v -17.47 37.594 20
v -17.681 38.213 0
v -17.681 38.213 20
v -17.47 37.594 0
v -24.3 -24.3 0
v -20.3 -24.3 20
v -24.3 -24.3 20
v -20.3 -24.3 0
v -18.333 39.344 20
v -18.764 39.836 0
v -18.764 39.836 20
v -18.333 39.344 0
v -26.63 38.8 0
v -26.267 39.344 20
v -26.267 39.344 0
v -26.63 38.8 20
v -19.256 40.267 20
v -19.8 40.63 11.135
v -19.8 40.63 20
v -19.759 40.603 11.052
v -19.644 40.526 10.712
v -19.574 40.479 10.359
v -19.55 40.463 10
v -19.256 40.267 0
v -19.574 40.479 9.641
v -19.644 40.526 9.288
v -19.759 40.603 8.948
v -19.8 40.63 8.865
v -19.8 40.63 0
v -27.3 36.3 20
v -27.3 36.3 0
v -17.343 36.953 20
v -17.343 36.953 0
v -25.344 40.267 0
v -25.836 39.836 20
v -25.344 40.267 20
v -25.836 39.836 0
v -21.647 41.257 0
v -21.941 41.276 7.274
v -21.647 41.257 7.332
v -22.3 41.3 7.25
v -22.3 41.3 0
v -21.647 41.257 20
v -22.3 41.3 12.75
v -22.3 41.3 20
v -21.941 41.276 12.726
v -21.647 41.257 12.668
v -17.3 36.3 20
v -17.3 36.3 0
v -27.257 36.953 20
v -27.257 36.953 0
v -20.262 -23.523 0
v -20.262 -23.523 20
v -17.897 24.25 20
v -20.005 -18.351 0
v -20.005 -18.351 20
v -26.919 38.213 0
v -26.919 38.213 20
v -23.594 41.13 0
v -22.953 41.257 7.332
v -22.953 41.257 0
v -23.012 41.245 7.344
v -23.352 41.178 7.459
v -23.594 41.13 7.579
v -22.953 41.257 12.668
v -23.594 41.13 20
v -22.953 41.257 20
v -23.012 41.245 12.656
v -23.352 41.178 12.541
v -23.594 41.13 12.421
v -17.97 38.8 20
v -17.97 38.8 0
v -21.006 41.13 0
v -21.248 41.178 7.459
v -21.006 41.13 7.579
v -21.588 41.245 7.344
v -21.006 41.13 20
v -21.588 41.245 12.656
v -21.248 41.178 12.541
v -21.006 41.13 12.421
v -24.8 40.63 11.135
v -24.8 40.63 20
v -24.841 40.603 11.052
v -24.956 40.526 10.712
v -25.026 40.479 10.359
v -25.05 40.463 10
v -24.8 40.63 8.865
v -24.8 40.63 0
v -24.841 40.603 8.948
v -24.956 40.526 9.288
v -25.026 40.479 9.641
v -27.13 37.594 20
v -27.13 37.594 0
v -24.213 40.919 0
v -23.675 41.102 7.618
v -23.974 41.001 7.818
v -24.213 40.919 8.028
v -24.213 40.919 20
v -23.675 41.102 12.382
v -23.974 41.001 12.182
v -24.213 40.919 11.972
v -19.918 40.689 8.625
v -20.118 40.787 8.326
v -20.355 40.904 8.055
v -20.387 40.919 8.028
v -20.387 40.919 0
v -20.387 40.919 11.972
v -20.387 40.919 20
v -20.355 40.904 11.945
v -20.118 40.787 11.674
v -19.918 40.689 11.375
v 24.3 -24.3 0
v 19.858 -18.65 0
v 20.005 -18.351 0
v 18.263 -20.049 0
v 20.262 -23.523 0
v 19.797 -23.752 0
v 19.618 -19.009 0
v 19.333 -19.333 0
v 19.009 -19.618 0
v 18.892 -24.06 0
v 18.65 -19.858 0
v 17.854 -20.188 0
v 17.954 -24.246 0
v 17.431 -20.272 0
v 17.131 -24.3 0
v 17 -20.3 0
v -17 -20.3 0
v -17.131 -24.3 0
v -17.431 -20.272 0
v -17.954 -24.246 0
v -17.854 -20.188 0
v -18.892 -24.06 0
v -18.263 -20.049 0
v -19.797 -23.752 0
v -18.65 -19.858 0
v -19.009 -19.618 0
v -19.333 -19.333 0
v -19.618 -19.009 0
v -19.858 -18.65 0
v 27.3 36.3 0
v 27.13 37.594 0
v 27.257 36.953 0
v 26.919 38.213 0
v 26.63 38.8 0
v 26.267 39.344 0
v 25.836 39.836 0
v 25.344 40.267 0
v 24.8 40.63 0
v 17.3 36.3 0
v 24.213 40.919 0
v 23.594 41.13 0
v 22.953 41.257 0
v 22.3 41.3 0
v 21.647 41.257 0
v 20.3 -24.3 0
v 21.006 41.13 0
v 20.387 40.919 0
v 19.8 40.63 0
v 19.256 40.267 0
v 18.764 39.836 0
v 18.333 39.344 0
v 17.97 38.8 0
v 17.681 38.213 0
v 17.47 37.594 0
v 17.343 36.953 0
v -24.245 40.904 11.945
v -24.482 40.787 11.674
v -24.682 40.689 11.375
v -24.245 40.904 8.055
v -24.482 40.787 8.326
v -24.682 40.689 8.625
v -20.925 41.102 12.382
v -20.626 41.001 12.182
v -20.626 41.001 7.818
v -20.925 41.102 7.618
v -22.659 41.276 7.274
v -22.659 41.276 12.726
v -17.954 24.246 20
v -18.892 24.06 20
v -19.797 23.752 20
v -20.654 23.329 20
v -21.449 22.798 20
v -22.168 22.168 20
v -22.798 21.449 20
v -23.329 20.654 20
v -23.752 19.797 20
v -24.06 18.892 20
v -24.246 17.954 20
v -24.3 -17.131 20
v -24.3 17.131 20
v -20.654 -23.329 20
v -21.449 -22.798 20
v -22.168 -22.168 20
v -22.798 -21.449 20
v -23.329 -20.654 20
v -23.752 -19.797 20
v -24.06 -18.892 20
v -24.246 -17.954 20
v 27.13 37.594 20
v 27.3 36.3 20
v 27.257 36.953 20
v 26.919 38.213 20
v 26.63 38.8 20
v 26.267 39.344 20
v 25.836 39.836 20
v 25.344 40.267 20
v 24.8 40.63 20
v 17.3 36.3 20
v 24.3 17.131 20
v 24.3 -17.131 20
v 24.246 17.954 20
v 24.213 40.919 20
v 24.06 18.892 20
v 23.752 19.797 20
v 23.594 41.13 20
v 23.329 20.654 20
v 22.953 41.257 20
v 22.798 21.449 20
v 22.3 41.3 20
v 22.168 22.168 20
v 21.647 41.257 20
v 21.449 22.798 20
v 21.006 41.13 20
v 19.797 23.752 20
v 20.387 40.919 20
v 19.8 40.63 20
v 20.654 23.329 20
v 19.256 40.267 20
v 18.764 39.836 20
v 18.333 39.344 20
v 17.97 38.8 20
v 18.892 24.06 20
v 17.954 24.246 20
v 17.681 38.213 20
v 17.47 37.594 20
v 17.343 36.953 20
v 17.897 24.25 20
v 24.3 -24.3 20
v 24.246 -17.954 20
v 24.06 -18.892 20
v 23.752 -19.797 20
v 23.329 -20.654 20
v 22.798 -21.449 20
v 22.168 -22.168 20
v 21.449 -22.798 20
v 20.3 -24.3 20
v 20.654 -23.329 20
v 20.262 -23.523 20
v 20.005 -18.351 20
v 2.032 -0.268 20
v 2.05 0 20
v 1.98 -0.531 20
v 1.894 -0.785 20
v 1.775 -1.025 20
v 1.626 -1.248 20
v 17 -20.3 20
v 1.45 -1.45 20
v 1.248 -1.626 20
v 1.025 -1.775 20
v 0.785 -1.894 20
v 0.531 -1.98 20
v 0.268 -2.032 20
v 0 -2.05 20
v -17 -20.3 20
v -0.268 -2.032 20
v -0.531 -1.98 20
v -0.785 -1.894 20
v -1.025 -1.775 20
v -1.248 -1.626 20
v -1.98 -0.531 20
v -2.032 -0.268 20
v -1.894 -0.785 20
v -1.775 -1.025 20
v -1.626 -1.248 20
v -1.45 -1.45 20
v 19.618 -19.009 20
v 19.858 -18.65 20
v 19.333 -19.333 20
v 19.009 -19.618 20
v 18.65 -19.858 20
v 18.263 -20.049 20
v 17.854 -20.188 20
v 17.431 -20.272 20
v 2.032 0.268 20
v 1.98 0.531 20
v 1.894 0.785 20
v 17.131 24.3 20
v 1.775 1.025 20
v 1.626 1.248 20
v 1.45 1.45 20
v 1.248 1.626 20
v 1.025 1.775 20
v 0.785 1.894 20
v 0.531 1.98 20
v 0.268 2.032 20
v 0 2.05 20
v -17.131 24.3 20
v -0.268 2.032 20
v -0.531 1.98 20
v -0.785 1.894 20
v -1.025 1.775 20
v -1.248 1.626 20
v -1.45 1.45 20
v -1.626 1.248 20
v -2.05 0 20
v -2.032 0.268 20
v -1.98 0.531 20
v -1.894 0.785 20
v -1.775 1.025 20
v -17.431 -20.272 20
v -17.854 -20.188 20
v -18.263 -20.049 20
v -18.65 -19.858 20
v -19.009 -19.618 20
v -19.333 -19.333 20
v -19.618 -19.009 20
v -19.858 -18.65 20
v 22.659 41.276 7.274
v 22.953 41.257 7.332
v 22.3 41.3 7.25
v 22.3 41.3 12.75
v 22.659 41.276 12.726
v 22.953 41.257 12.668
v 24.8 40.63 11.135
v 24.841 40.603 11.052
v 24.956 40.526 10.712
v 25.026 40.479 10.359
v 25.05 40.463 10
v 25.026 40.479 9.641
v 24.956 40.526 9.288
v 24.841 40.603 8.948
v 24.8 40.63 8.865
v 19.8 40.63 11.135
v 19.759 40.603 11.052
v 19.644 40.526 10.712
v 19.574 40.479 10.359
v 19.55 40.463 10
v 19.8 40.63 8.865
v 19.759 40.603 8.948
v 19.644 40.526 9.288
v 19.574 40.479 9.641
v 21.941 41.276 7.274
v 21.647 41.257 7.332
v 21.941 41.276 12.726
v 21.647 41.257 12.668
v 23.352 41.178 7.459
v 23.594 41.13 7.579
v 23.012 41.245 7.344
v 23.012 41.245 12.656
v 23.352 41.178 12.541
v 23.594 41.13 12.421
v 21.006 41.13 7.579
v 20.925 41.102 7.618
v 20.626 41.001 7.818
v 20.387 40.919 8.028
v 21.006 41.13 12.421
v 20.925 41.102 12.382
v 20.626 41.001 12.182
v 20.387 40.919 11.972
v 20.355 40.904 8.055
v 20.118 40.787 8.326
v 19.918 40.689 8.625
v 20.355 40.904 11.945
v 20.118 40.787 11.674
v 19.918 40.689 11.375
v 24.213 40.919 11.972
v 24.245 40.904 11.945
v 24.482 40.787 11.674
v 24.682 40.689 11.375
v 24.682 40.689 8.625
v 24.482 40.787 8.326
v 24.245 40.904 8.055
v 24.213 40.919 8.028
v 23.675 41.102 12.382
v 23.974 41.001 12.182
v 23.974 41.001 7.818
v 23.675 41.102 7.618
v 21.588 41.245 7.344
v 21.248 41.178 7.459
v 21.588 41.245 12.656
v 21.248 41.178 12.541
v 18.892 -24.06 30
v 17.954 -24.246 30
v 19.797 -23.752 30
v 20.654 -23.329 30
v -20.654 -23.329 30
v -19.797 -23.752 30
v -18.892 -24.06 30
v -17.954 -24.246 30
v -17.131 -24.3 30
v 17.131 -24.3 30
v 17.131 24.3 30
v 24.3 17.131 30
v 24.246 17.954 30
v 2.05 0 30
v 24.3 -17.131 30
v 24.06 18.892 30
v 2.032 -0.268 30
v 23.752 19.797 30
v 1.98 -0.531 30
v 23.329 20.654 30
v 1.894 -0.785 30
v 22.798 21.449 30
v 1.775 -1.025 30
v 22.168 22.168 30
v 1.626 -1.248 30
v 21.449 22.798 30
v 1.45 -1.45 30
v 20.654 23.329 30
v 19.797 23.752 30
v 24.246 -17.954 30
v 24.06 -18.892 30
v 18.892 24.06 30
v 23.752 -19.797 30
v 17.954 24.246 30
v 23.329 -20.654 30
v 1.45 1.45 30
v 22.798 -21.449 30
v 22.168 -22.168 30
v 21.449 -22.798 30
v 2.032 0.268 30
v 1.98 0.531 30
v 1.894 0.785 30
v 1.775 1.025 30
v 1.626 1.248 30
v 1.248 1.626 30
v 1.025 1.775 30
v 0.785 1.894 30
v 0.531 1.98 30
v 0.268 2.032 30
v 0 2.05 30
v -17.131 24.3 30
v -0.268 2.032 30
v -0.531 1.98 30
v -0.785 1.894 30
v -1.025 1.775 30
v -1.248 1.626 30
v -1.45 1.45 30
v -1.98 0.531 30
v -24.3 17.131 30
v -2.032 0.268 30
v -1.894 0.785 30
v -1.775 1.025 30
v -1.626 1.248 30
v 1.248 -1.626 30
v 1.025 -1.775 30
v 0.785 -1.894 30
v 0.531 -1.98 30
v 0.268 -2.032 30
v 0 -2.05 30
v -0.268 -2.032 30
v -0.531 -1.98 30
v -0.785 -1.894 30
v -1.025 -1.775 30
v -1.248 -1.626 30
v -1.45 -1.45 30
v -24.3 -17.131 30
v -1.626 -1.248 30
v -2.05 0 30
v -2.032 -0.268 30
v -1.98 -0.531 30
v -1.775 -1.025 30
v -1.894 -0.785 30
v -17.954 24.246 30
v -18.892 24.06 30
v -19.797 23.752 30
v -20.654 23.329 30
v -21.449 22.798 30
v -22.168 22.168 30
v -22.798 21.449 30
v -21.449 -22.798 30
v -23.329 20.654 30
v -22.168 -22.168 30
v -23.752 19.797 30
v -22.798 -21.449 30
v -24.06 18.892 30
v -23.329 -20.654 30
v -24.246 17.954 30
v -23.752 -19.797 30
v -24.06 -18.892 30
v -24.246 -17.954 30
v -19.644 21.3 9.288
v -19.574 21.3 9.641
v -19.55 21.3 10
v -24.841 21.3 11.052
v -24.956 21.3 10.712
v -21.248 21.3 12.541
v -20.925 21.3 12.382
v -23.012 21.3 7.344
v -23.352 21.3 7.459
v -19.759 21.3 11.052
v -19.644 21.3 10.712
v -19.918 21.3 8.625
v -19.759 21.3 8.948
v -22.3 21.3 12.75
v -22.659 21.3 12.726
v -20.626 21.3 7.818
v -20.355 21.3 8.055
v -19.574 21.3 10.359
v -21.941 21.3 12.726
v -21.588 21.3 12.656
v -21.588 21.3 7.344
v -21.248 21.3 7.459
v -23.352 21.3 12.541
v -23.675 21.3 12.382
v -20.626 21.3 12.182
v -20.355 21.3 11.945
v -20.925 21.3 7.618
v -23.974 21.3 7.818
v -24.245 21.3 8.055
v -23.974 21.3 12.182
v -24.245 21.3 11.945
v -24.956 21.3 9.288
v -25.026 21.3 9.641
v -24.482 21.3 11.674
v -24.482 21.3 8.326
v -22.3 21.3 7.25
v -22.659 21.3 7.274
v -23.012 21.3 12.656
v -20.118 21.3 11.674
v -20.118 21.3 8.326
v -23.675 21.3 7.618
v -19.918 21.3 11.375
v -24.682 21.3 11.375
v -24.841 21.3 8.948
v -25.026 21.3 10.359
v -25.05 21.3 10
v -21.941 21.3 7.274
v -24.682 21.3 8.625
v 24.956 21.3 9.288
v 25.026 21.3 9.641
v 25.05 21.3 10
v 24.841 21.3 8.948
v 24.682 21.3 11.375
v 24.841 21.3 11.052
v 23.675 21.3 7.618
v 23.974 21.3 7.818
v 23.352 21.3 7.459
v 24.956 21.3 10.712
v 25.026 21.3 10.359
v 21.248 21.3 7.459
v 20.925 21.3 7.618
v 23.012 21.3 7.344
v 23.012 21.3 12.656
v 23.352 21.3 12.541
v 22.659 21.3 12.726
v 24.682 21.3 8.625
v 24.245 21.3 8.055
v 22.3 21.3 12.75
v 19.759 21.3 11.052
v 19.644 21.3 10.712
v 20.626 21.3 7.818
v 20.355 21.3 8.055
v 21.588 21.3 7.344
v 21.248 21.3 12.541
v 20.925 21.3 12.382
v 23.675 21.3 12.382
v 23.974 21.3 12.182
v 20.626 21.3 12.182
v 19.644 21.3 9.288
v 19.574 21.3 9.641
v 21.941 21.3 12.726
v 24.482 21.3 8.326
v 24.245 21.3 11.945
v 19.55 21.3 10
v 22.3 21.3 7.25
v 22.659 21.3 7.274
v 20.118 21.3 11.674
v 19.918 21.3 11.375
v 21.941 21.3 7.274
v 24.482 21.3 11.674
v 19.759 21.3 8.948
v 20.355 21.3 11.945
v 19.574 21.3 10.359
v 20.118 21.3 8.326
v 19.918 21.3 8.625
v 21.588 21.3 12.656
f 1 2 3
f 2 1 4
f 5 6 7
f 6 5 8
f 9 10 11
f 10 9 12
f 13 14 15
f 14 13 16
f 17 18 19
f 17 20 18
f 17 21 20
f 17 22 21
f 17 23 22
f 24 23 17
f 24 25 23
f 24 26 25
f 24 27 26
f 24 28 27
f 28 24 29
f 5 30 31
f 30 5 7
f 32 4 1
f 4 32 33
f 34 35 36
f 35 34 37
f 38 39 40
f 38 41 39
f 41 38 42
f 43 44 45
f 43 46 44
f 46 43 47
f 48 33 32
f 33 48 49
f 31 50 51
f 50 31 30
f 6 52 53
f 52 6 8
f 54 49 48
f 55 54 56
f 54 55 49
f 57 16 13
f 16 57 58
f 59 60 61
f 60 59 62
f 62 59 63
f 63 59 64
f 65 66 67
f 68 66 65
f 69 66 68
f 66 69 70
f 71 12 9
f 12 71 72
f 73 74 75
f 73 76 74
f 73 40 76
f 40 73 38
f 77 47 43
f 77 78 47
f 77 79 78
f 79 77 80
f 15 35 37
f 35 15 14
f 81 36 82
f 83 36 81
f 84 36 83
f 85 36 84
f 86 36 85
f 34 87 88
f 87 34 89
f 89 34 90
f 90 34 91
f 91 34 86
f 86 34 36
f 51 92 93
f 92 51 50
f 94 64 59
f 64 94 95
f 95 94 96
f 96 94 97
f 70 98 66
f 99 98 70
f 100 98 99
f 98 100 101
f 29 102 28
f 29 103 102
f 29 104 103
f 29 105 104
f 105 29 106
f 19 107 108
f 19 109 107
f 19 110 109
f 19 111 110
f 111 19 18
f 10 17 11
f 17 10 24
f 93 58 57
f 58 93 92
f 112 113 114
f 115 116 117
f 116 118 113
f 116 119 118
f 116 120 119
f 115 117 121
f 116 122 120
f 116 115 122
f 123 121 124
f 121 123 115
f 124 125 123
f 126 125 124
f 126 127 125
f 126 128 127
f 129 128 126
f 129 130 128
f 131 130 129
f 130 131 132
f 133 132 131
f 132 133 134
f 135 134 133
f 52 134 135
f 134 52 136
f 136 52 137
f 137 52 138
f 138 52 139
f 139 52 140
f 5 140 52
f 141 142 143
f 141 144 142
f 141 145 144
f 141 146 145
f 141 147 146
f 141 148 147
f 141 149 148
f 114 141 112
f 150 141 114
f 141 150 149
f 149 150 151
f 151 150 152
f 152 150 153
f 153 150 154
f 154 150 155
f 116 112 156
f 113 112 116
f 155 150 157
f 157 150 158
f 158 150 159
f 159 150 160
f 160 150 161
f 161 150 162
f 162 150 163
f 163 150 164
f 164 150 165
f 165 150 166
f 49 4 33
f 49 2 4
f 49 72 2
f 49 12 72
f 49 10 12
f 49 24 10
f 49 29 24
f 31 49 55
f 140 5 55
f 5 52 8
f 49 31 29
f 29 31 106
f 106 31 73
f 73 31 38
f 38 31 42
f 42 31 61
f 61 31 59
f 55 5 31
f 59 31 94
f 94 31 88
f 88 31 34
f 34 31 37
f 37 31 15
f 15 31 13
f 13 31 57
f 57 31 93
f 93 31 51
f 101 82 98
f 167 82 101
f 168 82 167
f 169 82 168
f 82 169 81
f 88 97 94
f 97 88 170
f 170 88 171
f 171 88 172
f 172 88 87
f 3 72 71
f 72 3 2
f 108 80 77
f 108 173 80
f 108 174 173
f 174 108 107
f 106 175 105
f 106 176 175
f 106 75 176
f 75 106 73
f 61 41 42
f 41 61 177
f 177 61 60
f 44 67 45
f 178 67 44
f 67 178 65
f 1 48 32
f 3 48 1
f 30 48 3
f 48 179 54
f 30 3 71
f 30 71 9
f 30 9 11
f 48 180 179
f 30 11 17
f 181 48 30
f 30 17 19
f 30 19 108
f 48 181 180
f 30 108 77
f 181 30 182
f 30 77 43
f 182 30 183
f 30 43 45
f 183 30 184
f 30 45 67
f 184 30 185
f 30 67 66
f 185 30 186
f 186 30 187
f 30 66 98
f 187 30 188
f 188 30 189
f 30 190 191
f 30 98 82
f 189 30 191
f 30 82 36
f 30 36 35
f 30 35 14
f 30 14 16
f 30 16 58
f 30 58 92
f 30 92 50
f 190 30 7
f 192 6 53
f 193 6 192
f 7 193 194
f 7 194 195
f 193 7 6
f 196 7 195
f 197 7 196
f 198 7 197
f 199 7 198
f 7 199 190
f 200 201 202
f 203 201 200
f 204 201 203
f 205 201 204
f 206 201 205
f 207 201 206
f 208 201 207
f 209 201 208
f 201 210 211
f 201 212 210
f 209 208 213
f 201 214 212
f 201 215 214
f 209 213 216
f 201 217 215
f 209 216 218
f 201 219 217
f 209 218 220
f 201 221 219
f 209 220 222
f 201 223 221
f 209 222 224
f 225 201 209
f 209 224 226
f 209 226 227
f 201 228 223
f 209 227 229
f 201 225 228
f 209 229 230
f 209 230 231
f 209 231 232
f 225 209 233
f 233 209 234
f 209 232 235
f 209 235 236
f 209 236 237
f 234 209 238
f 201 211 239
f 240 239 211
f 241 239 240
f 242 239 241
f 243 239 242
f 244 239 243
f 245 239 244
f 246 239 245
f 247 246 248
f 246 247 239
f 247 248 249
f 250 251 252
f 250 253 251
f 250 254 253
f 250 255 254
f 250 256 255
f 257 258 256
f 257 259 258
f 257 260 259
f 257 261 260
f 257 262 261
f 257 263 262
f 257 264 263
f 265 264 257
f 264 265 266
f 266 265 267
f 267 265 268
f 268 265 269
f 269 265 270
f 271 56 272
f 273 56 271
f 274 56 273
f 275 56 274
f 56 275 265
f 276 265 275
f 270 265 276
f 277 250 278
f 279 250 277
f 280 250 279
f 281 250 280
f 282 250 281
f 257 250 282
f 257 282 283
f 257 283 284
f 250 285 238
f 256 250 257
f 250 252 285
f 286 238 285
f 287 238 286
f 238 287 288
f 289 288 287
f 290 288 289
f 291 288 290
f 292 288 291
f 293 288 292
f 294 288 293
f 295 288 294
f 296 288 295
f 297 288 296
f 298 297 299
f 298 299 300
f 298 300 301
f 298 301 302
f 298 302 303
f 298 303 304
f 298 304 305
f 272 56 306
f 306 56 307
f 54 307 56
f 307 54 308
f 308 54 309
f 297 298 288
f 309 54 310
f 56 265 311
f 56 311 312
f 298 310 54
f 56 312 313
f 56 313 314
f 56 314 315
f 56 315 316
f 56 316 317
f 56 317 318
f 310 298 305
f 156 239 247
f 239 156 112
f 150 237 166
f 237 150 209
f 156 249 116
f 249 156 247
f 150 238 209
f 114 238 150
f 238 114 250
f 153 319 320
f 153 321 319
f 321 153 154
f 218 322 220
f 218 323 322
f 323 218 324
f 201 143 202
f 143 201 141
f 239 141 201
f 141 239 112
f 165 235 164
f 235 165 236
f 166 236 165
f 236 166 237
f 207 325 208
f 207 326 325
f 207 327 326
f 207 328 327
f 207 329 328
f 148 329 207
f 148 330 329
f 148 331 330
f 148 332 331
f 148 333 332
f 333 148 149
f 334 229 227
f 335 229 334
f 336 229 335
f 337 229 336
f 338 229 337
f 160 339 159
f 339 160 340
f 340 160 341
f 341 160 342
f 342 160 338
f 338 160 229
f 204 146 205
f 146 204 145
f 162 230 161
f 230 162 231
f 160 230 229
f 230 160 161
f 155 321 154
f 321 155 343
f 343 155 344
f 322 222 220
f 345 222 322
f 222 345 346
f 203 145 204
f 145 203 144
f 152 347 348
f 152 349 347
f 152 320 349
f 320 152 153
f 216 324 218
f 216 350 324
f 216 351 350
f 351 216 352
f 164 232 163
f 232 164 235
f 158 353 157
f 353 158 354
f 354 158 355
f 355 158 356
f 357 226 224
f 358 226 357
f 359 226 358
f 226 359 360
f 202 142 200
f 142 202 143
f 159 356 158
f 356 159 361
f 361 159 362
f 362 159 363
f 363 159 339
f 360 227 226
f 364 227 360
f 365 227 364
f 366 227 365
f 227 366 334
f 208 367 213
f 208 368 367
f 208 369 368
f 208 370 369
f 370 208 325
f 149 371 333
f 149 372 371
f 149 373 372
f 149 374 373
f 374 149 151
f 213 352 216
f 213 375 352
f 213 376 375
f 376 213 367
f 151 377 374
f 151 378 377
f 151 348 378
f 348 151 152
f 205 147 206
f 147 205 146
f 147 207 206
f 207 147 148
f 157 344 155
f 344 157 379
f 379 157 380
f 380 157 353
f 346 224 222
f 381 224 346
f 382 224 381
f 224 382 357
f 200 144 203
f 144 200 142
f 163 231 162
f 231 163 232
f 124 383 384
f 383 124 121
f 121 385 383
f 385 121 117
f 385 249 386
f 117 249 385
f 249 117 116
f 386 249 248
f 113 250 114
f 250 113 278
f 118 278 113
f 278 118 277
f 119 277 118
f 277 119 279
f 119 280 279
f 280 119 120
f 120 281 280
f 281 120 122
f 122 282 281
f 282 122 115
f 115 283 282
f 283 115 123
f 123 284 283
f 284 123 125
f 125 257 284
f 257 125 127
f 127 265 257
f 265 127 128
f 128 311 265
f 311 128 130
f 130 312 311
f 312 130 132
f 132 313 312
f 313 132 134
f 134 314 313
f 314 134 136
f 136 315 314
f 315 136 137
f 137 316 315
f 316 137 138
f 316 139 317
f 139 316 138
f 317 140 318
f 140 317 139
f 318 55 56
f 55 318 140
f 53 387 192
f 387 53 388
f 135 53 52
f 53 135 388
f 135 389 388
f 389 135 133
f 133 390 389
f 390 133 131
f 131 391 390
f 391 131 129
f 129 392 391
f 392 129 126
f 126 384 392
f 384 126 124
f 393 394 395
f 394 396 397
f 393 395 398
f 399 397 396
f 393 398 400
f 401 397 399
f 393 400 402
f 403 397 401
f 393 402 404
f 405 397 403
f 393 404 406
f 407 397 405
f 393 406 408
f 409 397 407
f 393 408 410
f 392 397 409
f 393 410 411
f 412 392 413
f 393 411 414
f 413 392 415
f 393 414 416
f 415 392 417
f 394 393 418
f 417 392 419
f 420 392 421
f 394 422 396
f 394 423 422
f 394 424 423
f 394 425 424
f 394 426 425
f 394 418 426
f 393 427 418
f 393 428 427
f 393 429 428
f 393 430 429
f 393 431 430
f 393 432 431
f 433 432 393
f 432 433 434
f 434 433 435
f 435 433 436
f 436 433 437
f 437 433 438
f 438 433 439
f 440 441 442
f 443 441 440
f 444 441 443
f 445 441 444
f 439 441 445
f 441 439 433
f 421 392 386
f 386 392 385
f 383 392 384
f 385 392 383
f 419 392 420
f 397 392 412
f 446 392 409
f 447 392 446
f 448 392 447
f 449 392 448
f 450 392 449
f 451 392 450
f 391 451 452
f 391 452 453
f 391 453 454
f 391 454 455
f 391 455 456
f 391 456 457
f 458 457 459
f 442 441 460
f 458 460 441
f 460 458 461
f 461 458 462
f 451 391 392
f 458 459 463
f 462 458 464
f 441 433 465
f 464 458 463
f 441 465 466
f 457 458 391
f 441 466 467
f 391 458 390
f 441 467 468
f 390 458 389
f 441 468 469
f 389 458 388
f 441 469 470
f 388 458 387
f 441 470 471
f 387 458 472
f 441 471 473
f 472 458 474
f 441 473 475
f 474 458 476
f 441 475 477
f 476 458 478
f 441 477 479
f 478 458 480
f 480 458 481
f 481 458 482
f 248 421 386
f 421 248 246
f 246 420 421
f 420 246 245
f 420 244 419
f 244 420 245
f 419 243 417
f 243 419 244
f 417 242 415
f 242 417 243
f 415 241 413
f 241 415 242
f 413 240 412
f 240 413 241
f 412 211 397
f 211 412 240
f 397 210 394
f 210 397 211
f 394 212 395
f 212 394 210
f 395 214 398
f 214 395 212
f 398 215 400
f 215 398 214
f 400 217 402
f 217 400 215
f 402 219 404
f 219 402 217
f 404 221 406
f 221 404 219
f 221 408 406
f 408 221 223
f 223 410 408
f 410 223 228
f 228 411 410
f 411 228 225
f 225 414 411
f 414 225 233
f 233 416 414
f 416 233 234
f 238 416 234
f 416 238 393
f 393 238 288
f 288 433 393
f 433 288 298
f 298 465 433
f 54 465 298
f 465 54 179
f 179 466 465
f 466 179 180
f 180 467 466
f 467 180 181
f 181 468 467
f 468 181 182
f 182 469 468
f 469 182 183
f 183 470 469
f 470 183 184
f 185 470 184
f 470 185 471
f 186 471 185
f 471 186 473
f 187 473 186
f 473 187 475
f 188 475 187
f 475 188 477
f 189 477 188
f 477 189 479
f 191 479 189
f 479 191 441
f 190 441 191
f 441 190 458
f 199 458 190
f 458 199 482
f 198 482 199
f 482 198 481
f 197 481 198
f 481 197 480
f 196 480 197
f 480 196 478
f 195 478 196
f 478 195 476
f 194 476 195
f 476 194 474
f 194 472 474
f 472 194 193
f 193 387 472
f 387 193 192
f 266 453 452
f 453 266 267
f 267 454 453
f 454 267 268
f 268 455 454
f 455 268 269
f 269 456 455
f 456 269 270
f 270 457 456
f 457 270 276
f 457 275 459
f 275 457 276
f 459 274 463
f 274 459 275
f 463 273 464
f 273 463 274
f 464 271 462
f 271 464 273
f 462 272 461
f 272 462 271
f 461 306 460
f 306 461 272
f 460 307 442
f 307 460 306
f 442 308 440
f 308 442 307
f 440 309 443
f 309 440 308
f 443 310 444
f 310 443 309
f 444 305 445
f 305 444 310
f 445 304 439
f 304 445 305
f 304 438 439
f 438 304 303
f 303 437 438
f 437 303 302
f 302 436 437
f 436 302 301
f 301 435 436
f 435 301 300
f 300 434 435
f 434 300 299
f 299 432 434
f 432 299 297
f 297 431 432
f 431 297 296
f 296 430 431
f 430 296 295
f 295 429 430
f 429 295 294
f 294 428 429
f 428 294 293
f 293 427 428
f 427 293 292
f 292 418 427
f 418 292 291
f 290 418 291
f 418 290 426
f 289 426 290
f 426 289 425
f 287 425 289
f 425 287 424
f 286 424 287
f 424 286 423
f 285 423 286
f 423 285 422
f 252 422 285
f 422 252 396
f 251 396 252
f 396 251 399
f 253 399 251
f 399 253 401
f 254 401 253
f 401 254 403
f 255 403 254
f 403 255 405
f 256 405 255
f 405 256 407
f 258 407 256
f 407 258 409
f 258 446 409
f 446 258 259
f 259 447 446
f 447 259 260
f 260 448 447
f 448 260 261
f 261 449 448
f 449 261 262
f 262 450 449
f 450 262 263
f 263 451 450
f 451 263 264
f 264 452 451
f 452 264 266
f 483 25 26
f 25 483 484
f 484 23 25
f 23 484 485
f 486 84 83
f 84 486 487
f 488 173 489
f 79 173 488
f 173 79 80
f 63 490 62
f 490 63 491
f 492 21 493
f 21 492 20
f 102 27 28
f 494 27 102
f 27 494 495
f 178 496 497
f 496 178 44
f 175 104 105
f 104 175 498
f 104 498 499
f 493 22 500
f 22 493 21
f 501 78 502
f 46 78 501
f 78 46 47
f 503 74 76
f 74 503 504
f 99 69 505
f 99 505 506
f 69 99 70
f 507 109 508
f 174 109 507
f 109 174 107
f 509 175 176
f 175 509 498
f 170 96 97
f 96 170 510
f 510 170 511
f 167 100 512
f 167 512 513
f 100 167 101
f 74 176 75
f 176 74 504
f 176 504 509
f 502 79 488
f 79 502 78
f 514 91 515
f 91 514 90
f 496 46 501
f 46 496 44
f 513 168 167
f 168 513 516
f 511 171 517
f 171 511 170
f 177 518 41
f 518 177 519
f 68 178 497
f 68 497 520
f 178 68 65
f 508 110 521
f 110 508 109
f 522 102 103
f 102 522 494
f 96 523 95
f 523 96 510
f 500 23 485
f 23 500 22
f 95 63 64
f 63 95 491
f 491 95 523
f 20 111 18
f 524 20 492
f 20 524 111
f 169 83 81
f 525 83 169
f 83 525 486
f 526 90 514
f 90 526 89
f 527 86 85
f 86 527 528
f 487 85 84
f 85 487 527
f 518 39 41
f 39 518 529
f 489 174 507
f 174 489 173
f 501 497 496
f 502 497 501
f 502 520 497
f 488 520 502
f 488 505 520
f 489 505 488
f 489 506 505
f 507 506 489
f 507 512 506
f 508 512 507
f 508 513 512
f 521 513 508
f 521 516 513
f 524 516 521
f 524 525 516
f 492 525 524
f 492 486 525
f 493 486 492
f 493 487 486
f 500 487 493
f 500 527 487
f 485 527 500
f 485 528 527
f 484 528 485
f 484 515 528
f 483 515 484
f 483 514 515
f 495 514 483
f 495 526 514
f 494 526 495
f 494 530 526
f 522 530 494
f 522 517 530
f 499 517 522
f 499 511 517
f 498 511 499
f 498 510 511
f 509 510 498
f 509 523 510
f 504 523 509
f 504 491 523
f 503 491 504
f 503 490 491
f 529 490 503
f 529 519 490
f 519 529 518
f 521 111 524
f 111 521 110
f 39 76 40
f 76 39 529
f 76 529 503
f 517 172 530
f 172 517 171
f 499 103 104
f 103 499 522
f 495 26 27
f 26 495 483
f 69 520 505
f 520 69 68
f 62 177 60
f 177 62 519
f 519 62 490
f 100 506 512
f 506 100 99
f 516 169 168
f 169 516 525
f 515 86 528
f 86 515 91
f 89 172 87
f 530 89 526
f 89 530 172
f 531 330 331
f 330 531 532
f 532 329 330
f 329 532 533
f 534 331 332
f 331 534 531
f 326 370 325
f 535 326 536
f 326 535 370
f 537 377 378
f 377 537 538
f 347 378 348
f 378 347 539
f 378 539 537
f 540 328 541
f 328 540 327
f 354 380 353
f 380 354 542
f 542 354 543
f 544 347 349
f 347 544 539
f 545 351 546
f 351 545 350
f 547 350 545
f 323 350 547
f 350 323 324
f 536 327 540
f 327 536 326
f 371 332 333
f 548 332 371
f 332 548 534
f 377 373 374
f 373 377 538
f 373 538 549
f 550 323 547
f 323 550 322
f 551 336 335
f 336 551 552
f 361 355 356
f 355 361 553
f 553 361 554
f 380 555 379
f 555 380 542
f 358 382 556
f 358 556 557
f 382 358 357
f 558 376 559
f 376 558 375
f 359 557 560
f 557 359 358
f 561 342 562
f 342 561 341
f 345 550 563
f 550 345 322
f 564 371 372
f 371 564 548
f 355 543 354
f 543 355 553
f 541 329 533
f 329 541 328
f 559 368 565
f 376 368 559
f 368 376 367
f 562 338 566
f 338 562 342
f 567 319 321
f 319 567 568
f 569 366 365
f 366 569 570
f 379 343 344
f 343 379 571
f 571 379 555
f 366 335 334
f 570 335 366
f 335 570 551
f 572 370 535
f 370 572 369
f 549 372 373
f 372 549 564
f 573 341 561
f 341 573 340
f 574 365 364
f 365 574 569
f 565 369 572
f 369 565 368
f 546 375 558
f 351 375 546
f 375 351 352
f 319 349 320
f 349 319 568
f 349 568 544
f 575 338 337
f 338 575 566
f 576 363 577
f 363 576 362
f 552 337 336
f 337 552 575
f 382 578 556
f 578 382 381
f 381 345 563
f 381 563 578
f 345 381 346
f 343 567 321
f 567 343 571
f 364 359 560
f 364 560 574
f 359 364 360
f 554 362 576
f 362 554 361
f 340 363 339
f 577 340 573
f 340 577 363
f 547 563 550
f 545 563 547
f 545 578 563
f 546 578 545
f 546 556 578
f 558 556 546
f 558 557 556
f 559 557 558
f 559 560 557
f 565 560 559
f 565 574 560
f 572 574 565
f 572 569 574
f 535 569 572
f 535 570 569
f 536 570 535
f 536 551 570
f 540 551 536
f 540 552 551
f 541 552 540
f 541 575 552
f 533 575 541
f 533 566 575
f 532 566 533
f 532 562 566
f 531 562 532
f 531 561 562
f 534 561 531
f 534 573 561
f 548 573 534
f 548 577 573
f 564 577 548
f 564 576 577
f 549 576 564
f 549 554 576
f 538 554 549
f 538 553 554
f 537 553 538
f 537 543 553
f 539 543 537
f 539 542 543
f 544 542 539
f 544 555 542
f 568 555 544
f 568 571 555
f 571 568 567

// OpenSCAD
// =============================================================================
// mount_base.scad - Antarmuka ke permukaan pemasangan
// =============================================================================
//  Empat tipe di params.scad -> tipe_mount:
//    "pipa"    : klem busur 300 derajat menjepit pipa bulat (diameter_pipa_luar)
//    "hollow"  : klem C untuk BESI HOLLOW PERSEGI / stal kotak (frame atap)
//    "baut"    : flange dengan lubang M5 untuk rangka logam
//    "dinding" : dasbor lebar + 2 lubang sekrup ke dinding
//
//  Semua tipe menyisakan bidang mating datar di ujung atas (sisi +Z) sebagai
//  tempat lengan kamera disambung, sehingga panjang lengan bebas diubah
//  tanpa mencetak ulang bagian klem.
//
//  KLEM HOLLOW - KENAPA BUKAN CINCIN PENUH
//    Klem C yang kaku (membungkus 270 derajat) hanya bisa dipasang dengan
//    DISELIPKAN DARI UJUNG hollow, karena dinding klem tidak bisa dilentarkan.
//    Kalau frame atap sudah terpasang, itu tidak mungkin. Solusinya: klem
//    dibuka di satu sisi, lalu dua lug diikat satu baut M5 -> dua bagian,
//    bisa dipasang di mana saja sepanjang hollow.
//
//  ARAH PASANG (klem hollow)
//    1. cetak klem_hollow
//    2. badan C masuk dari bawah hollow (sisi -Y), celah menghadap +Y
//    3. masukkan baut M5 ke dua lug, kencangkan sampai celah rapat
//    4. pasang lengan: baut M5 kedua lewat flange lengan ke lubang tengah
//       plat dasar (self-tap)
//
//  BEBAN: plat dasar (klem_hollow_pelat_t, 10 mm) menopang SELURUH berat box
//  dan sekaligus jadi dudukan self-tap M5 lengan, jadi sengaja lebih tebal
//  dari flange tipe lain yang cuma 6 mm.
// =============================================================================

include <params.scad>

flange_d = flange_d_efektif;   // ikut menyesuaikan ukuran klem mount
flange_t = antarmuka_flange_t;

clr_m5_rapat   = diameter_baut_antarmuka_d - 0.9;  // self-tap M5 (flange lengan)
clr_m5_longgar = diameter_baut_antarmuka_d + 0.5;  // clearance M5 (baut klem)

// Versi "_isi" dipakai assembly.scad (dibungkus union), versi polos
// untuk render/cetak mandiri.
module mount_base_isi() {
    if (tipe_mount == "pipa") {
        klem_pipa();
        flange_atas();
    } else if (tipe_mount == "hollow") {
        klem_hollow();
    } else if (tipe_mount == "baut") {
        flange_baut();
    } else if (tipe_mount == "dinding") {
        dasbor_dinding();
    } else {
        echo("tipe_mount tidak dikenal: ", tipe_mount);
    }
}

// Flange tipis di bagian atas klem, menjadi dudukan baut M5 untuk lengan
// CATATAN: tanpa translate z. Flange occupy z 0..flange_t supaya z = 0
// adalah bidang mating yang menempel ke lengan. Dulu ada
// translate([0,0,flange_t/2]) dengan maksud "memusatkan", padahal
// linear_extrude sudah mulai dari z 0 - hasilnya flange tergeser ke
// z 3..9 dan mating face meleset 3 mm ke atas.
module flange_atas() {
    linear_extrude(height = flange_t)
        difference() {
            circle(d = flange_d);
            circle(d = clr_m5_rapat);
        }
}

// --- Baut M5 pada flange: dipakai bersama semua tipe ---
// Sama seperti flange_atas(): occupy z 0..t, tanpa translate.
module baut_m5(t = flange_t) {
    linear_extrude(height = t)
        difference() {
            circle(d = flange_d);
            circle(d = clr_m5_rapat);
        }
}

// =============================================================================
//  KLEM HOLLOW PERSEGI (tipe_mount = "hollow")
// =============================================================================
//  Profile hollow memakai operasi "closing": offset(r) lalu offset(delta = -r).
//  Itu membulatkan HANYA sudut dalam dan menyisakan sudut luar tetap siku -
//  persis seperti penampang luar besi hollow sungguhan. Kalau cukup pakai
//  offset(r) saja, sudut dalam ikut melebar dan klem tidak akan menempel
//  ke hollow, hanya menyentuhnya di tengah sisi.
module profil_dalam_hollow() {
    a = hollow_a / 2 + klem_hollow_clr;
    b = hollow_b / 2 + klem_hollow_clr;
    r = hollow_r + klem_hollow_clr;
    offset(r = r) offset(delta = -r)
        square([2 * a, 2 * b], center = true);
}

// Permukaan luar klem = offset normal dari profil dalam setebal klem_tebal,
// sehingga ketebalan dinding klem seragam di semua sisi termasuk di sudut.
module profil_luar_hollow() {
    offset(delta = klem_tebal) profil_dalam_hollow();
}

// Badan klem: 3 sisi (-X, -Y, +X), terbuka di sisi +Y untuk installation
module klem_hollow_cshape() {
    a = hollow_a / 2 + klem_hollow_clr + klem_tebal;
    b = hollow_b / 2 + klem_hollow_clr + klem_tebal;
    difference() {
        difference() {
            profil_luar_hollow();
            profil_dalam_hollow();
        }
        // Buang dinding +Y. Lebar penuh 2*a, sehingga dinding -X dan +X ikut
        // hilang di baris paling +Y - inilah yang membuat bentuknya "C".
        translate([-a, b - klem_tebal - 1, -1])
            square([2 * a, klem_tebal + 2]);
    }
}

// Satu lug baut: web segitiga dari dinding sisi ke boss di ujungnya.
// Dibuat penuh setinggi klem, jadi aman tanpa support saat dicetak.
module klem_hollow_lug(sx) {
    a = hollow_a / 2 + klem_hollow_clr + klem_tebal;
    b = hollow_b / 2 + klem_hollow_clr + klem_tebal;
    y_boss = b + klem_hollow_lug_p;
    hull() {
        // pangkal menempel dinding sisi, setinggi penuh
        translate([sx * (a - klem_tebal / 2), 0])
            square([klem_tebal, 2 * b], center = true);
        // boss tempat baut M5 menyeberang
        translate([sx * (a - klem_tebal / 2), y_boss])
            circle(d = klem_hollow_lug_d);
    }
}

// Klem hollow: PLAT DI ATAS (z mount_pelat_t .. +mount_pelat_t), badan C dan
// lug DI BAWAHNYA (z 0 .. klem_panjang).
//
// Kenapa plat harus di atas:
//   - Plat itu yang jadi dudukan baut M5 lengan, jadi lengan harus bisa
//     duduk DI ATASNYA. Kalau plat di bawah, batang lengan akan menembus.
//   - Klem ini juga jadi tempat hollow "berjepit" antara plat atas dan C bawah,
//     persis cara klem C pada umumnya bekerja.
//   - Untuk mounting di frame atap, orientasi ini juga benar: plat menyentuh
//     sisi atas hollow, lengan menjulang ke atas dari situ.
module klem_hollow() {
    a = hollow_a / 2 + klem_hollow_clr + klem_tebal;
    y_boss = hollow_b / 2 + klem_hollow_clr + klem_tebal + klem_hollow_lug_p;
    difference() {
        union() {
            // --- badan C + 2 lug, z 0 .. klem_panjang ---
            union() {
                linear_extrude(height = klem_panjang) klem_hollow_cshape();
                for (sx = [-1, 1])
                    linear_extrude(height = klem_panjang) klem_hollow_lug(sx);
            }
            // --- plat ATAS: duduk di puncak badan C, z klem_panjang .. +pelat ---
            // Plat ini yang jadi dudukan baut M5 lengan, jadi lengan bisa
            // duduk DI ATASNYA. Kalau plat di bawah, batang lengan akan
            // menembus. Untuk mounting di frame atap orientasi ini juga
            // benar: plat menyentuh sisi atas hollow.
            translate([0, 0, klem_panjang])
                linear_extrude(height = mount_pelat_t)
                    difference() {
                        profil_luar_hollow();
                        circle(d = clr_m5_rapat);   // self-tap M5 untuk lengan
                    }
        }
        // lubang baut M5 melintang, setinggi tengah klem
        for (sx = [-1, 1])
            translate([sx * (a - klem_tebal / 2), y_boss, klem_panjang / 2])
                rotate([-90, 0, 0])
                    cylinder(d = klem_hollow_lug_t, h = klem_hollow_lug_d * 3,
                             center = true);
    }
}

// --- Tipe 1: klem pipa dua bagian ---
// Cangkang busur 300 derajat (bukan cincin penuh) agar bisa dipasang ke
// pipa tanpa harus membelah pipa.
// Busur dibuka di sisi +Y (arah depan), bukan di sisi atas, supaya klem
// tetap menggantung di Around pipa saat lengan kamera menekan ke bawah.
module busur(r, tebal, tinggi, sudut_buka = 60) {
    r_out = r + tebal;
    difference() {
        linear_extrude(height = tinggi)
            difference() {
                circle(r = r_out);
                circle(r = r);
            }
        // Potong sudut pembuka (60 derajat) menghadap +Y
        rotate([0, 0, 90 - sudut_buka / 2])
            translate([0, -r_out - 1, -1])
                linear_extrude(height = tinggi + 2)
                    square([2 * r_out + 2, r_out + 1]);
    }
}

module klem_pipa() {
    r_in = diameter_pipa_luar / 2 + 0.20;
    r_out = r_in + klem_tebal;
    tinggi_klem = klem_panjang;

    // Klem digantung, opening menghadap +Y
    translate([0, 0, flange_t]) rotate([0, 0, 180])
        busur(r_in, klem_tebal, tinggi_klem, 60);

    // Baut pengetat klem (sumbu X, memotong celah pembuka).
    // PENTING: cakram lug harus diberi web yang menyambungkannya ke busur.
    // Tanpa web, lug hanya menyentuh busur di satu titik dan diekspor STL
    // sebagai komponen terpisah yang akan jatuh sendiri saat dicetak.
    // Web diarahkan ke sisi +Y karena busur (setelah rotate 180) ada di +Y.
    for (sx = [-1, 1])
        translate([sx * r_out, 0, flange_t + tinggi_klem / 2])
            rotate([0, 90, 0])
                linear_extrude(height = klem_tebal, center = true)
                    difference() {
                        union() {
                            circle(d = 7);
                            translate([-7, 0])
                                square([14, r_out + 2]);
                        }
                        circle(d = diameter_baut_antarmuka_d - 0.9);
                    }
}

// --- Tipe 2: flange baut M5 ---
module flange_baut() {
    baut_m5();
    // Penguat ribs
    for (a = [0, 90, 180, 270])
        rotate([0, 0, a])
            translate([flange_d / 2 - 2, 0, 0])
                rotate([90, 0, 0])
                    linear_extrude(height = flange_t)
                        square([10, 6], center = true);
}

// Dudukan dinding: dasbor + boss di belakang, ketebalannya realistis.
module dasbor_dinding() {
    linear_extrude(height = dinding_dasbor_tebal)
        difference() {
            offset(r = 6)
                square([dinding_dasbor_lebar, dinding_dasbor_panjang], center = true);
            // Lubang sekrup dinding (2 buah, simetris)
            for (sy = [-1, 1])
                translate([0, sy * dinding_dasbor_panjang / 4])
                    circle(d = diameter_sekrup_dinding);
        }
    // Boss tengah untuk disambung lengan
    translate([0, 0, dinding_dasbor_tebal])
        linear_extrude(height = flange_t)
            difference() {
                circle(d = flange_d);
                circle(d = clr_m5_rapat);
            }
}

// --- Render mandiri (dilewati ketika di-include assembly) ---
if (is_undef(tampilkan_standalone_ov) || tampilkan_standalone_ov) {
    color("DimGray") mount_base_isi();
}
